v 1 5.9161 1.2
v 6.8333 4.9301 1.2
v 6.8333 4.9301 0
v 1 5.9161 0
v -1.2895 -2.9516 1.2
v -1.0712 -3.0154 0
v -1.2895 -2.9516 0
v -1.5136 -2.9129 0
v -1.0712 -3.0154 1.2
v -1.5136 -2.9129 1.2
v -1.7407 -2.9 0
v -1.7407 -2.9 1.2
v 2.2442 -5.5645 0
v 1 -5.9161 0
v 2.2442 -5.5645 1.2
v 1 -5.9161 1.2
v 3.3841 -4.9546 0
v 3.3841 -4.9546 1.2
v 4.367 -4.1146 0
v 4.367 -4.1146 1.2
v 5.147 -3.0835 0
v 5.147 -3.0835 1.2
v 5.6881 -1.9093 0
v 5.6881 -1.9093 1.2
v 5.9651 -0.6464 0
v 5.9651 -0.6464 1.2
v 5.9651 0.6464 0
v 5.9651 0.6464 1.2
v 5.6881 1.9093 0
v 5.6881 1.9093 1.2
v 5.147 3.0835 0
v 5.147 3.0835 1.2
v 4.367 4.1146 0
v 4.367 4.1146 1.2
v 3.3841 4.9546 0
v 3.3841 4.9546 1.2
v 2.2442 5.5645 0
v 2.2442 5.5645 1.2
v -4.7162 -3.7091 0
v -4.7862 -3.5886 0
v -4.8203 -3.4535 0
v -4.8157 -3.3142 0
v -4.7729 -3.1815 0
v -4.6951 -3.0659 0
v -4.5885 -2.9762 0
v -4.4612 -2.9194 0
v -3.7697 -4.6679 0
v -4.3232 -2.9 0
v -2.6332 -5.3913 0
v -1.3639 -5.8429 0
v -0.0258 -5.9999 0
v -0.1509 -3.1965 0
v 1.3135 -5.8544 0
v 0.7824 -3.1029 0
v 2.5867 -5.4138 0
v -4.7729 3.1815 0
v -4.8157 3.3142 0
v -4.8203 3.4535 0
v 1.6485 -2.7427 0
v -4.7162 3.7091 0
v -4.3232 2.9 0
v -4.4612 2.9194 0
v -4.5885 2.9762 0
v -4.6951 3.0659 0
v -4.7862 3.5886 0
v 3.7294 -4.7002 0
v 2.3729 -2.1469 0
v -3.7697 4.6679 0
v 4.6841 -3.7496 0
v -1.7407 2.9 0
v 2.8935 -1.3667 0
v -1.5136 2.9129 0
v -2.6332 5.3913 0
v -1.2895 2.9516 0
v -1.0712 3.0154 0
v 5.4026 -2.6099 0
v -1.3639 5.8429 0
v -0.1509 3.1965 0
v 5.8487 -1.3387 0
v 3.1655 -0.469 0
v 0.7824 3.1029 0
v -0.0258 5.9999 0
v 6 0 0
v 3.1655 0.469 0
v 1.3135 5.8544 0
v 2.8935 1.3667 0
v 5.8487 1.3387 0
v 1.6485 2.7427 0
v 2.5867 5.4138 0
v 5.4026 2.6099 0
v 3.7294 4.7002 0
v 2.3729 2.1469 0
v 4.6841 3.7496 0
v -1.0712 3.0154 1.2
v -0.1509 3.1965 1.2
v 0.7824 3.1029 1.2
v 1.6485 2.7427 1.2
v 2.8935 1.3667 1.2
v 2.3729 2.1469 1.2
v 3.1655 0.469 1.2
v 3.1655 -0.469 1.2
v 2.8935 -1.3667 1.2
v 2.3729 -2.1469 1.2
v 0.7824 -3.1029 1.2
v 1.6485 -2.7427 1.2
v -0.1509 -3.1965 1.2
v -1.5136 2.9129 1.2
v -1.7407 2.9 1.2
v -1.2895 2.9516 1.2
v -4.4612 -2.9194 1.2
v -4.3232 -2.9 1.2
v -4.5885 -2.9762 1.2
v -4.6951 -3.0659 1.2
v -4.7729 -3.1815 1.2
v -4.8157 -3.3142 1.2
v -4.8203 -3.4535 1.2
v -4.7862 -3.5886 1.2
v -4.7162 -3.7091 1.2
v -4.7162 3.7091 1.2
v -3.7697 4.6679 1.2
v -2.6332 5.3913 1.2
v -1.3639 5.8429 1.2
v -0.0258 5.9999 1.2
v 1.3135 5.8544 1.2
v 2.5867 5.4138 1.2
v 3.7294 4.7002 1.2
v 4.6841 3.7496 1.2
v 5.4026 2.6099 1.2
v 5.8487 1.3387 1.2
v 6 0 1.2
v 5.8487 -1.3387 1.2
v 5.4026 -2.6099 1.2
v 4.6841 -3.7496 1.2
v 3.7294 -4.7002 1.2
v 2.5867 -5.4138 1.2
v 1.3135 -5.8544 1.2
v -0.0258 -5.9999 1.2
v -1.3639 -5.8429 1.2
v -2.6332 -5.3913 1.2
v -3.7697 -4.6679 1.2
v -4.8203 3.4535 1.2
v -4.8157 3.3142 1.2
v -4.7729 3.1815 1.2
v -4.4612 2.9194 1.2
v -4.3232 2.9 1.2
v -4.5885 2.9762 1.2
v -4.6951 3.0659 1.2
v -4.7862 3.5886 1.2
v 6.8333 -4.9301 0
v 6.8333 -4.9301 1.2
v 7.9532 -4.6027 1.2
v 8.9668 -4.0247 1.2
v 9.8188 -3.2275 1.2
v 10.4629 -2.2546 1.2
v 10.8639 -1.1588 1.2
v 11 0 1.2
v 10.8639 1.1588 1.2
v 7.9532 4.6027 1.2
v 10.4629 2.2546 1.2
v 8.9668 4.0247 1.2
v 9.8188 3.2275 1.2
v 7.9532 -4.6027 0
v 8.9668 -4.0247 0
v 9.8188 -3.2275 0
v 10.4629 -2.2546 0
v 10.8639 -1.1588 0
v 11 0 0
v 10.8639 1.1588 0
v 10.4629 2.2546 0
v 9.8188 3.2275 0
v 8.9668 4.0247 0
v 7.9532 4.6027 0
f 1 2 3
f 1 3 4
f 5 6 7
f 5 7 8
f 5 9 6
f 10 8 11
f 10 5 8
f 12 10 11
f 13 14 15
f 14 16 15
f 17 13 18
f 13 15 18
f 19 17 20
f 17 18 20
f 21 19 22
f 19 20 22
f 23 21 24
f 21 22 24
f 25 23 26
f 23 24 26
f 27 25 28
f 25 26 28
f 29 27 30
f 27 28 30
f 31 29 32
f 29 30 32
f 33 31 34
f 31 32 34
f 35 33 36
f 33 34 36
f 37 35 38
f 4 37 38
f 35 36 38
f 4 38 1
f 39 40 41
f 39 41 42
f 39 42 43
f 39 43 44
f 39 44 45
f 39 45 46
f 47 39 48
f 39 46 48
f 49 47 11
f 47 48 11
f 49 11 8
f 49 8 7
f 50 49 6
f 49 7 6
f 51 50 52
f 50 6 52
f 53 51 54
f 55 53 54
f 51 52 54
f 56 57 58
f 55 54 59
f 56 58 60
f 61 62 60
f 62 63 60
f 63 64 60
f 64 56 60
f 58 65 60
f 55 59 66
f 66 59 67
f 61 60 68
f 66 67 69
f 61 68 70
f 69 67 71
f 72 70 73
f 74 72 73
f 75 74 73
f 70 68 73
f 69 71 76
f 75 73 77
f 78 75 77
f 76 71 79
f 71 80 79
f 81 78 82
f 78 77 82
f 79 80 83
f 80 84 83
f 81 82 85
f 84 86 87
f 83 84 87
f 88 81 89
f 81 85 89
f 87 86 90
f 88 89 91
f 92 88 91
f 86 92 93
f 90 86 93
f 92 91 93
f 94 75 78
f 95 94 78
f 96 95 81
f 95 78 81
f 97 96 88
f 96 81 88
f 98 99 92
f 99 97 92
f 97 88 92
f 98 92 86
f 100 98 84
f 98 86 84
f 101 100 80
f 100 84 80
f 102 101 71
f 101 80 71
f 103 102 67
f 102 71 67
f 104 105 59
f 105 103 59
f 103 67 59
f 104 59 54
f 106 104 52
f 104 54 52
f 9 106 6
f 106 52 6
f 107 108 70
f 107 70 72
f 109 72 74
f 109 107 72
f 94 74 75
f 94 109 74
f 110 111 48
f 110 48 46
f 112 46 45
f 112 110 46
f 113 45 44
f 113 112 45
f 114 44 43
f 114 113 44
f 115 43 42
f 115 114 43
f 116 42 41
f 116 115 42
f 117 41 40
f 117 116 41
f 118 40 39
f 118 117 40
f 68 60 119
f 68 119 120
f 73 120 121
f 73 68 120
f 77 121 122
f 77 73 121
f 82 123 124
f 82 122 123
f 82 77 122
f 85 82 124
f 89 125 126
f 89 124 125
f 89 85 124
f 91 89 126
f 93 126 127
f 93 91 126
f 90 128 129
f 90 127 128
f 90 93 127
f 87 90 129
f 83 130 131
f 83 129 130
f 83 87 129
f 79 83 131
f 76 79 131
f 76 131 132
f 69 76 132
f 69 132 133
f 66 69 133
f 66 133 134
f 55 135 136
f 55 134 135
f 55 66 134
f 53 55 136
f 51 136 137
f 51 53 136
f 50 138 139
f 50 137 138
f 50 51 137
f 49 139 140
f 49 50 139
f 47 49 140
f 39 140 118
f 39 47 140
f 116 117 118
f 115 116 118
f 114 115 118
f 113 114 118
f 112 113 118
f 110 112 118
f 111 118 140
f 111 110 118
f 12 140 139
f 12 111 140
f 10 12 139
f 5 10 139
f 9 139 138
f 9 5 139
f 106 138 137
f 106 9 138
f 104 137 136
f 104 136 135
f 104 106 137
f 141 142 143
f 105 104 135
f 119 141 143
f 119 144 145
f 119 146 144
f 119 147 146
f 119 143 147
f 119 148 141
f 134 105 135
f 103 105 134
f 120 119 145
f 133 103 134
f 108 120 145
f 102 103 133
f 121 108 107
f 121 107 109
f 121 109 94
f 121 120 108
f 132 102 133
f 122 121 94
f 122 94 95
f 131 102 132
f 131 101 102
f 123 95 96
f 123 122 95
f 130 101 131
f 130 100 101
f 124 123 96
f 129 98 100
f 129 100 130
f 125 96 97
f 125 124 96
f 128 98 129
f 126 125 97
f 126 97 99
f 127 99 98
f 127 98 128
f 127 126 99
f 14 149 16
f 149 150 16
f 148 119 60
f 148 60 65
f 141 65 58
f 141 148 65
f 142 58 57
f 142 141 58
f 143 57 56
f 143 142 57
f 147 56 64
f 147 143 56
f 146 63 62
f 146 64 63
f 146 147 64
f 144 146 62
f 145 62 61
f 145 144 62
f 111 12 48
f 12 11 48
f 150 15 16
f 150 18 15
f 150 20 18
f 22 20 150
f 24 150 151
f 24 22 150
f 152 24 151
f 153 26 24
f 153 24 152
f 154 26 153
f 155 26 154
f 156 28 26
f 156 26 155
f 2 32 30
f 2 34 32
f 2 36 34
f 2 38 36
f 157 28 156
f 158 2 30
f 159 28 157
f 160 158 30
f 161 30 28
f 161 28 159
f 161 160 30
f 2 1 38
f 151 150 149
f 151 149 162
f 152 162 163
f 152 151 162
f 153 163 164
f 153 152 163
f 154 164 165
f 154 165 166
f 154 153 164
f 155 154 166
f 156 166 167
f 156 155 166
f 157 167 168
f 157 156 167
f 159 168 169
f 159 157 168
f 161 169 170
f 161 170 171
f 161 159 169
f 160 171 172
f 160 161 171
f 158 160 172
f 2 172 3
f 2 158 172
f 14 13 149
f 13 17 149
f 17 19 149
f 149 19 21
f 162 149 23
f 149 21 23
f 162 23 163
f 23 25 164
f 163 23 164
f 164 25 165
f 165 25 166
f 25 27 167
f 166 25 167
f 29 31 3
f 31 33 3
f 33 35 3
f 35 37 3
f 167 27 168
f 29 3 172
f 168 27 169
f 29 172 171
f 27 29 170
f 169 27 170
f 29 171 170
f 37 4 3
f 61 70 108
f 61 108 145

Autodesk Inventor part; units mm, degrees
ref_plane "YZ Plane" through (0, 0, 0) normal (1, 0, 0) x (0, 1, 0)
ref_plane "XZ Plane" through (0, 0, 0) normal (0, 1, 0) x (-1, 0, 0)
ref_plane "XY Plane" through (0, 0, 0) normal (0, 0, 1) x (1, 0, 0)
sketch "Sketch1" plane through (0, 0, 0) normal (0, 0, 1) x (1, 0, 0)
  arc A0 (-1.3528, -2.9) -> (-1.3528, 2.9) centre (0, 0) ccw
  arc A1 (-5.2526, -2.9) -> (-5.2526, 2.9) centre (0, 0) ccw
  line L0 (-1.3528, 2.9) -> (-5.2526, 2.9)
  line L1 (-1.3528, -2.9) -> (-5.2526, -2.9)
  dimension "d0" = 6.4
  dimension "d1" = 12
  dimension "d2" = 5.8
  dimension "d3" = 2.9
extrude "Extrusion1" add sketch "Sketch1" along normal blind 1.2
fillet "Fillet1" radius 0.5 2 edges at (-5.2526, 2.9, 0.6) (-5.2526, -2.9, 0.6)
fillet "Fillet2" radius 2 2 edges at (-1.3528, 2.9, 0.6) (-1.3528, -2.9, 0.6)
sketch "Sketch2" plane through (0, 0, 1.2) normal (0, 0, 1) x (1, 0, 0)
  arc A0 (-4.7162, -3.7091) -> (-4.7162, 3.7091) centre (0, 0) ccw projected
  arc A1 (6.8333, -4.9301) -> (6.8333, 4.9301) centre (6, 0) ccw
  line L0 (6.8333, 4.9301) -> (1, 5.9161)
  line L1 (6.8333, -4.9301) -> (1, -5.9161)
  dimension "d8" = 10
extrude "Extrusion2" add sketch "Sketch2" against normal up to surface (1.2 mm away)
equation "\"d3\" = 0.5 * d2"
properties part number "BowdenConnectorPlayClip"
